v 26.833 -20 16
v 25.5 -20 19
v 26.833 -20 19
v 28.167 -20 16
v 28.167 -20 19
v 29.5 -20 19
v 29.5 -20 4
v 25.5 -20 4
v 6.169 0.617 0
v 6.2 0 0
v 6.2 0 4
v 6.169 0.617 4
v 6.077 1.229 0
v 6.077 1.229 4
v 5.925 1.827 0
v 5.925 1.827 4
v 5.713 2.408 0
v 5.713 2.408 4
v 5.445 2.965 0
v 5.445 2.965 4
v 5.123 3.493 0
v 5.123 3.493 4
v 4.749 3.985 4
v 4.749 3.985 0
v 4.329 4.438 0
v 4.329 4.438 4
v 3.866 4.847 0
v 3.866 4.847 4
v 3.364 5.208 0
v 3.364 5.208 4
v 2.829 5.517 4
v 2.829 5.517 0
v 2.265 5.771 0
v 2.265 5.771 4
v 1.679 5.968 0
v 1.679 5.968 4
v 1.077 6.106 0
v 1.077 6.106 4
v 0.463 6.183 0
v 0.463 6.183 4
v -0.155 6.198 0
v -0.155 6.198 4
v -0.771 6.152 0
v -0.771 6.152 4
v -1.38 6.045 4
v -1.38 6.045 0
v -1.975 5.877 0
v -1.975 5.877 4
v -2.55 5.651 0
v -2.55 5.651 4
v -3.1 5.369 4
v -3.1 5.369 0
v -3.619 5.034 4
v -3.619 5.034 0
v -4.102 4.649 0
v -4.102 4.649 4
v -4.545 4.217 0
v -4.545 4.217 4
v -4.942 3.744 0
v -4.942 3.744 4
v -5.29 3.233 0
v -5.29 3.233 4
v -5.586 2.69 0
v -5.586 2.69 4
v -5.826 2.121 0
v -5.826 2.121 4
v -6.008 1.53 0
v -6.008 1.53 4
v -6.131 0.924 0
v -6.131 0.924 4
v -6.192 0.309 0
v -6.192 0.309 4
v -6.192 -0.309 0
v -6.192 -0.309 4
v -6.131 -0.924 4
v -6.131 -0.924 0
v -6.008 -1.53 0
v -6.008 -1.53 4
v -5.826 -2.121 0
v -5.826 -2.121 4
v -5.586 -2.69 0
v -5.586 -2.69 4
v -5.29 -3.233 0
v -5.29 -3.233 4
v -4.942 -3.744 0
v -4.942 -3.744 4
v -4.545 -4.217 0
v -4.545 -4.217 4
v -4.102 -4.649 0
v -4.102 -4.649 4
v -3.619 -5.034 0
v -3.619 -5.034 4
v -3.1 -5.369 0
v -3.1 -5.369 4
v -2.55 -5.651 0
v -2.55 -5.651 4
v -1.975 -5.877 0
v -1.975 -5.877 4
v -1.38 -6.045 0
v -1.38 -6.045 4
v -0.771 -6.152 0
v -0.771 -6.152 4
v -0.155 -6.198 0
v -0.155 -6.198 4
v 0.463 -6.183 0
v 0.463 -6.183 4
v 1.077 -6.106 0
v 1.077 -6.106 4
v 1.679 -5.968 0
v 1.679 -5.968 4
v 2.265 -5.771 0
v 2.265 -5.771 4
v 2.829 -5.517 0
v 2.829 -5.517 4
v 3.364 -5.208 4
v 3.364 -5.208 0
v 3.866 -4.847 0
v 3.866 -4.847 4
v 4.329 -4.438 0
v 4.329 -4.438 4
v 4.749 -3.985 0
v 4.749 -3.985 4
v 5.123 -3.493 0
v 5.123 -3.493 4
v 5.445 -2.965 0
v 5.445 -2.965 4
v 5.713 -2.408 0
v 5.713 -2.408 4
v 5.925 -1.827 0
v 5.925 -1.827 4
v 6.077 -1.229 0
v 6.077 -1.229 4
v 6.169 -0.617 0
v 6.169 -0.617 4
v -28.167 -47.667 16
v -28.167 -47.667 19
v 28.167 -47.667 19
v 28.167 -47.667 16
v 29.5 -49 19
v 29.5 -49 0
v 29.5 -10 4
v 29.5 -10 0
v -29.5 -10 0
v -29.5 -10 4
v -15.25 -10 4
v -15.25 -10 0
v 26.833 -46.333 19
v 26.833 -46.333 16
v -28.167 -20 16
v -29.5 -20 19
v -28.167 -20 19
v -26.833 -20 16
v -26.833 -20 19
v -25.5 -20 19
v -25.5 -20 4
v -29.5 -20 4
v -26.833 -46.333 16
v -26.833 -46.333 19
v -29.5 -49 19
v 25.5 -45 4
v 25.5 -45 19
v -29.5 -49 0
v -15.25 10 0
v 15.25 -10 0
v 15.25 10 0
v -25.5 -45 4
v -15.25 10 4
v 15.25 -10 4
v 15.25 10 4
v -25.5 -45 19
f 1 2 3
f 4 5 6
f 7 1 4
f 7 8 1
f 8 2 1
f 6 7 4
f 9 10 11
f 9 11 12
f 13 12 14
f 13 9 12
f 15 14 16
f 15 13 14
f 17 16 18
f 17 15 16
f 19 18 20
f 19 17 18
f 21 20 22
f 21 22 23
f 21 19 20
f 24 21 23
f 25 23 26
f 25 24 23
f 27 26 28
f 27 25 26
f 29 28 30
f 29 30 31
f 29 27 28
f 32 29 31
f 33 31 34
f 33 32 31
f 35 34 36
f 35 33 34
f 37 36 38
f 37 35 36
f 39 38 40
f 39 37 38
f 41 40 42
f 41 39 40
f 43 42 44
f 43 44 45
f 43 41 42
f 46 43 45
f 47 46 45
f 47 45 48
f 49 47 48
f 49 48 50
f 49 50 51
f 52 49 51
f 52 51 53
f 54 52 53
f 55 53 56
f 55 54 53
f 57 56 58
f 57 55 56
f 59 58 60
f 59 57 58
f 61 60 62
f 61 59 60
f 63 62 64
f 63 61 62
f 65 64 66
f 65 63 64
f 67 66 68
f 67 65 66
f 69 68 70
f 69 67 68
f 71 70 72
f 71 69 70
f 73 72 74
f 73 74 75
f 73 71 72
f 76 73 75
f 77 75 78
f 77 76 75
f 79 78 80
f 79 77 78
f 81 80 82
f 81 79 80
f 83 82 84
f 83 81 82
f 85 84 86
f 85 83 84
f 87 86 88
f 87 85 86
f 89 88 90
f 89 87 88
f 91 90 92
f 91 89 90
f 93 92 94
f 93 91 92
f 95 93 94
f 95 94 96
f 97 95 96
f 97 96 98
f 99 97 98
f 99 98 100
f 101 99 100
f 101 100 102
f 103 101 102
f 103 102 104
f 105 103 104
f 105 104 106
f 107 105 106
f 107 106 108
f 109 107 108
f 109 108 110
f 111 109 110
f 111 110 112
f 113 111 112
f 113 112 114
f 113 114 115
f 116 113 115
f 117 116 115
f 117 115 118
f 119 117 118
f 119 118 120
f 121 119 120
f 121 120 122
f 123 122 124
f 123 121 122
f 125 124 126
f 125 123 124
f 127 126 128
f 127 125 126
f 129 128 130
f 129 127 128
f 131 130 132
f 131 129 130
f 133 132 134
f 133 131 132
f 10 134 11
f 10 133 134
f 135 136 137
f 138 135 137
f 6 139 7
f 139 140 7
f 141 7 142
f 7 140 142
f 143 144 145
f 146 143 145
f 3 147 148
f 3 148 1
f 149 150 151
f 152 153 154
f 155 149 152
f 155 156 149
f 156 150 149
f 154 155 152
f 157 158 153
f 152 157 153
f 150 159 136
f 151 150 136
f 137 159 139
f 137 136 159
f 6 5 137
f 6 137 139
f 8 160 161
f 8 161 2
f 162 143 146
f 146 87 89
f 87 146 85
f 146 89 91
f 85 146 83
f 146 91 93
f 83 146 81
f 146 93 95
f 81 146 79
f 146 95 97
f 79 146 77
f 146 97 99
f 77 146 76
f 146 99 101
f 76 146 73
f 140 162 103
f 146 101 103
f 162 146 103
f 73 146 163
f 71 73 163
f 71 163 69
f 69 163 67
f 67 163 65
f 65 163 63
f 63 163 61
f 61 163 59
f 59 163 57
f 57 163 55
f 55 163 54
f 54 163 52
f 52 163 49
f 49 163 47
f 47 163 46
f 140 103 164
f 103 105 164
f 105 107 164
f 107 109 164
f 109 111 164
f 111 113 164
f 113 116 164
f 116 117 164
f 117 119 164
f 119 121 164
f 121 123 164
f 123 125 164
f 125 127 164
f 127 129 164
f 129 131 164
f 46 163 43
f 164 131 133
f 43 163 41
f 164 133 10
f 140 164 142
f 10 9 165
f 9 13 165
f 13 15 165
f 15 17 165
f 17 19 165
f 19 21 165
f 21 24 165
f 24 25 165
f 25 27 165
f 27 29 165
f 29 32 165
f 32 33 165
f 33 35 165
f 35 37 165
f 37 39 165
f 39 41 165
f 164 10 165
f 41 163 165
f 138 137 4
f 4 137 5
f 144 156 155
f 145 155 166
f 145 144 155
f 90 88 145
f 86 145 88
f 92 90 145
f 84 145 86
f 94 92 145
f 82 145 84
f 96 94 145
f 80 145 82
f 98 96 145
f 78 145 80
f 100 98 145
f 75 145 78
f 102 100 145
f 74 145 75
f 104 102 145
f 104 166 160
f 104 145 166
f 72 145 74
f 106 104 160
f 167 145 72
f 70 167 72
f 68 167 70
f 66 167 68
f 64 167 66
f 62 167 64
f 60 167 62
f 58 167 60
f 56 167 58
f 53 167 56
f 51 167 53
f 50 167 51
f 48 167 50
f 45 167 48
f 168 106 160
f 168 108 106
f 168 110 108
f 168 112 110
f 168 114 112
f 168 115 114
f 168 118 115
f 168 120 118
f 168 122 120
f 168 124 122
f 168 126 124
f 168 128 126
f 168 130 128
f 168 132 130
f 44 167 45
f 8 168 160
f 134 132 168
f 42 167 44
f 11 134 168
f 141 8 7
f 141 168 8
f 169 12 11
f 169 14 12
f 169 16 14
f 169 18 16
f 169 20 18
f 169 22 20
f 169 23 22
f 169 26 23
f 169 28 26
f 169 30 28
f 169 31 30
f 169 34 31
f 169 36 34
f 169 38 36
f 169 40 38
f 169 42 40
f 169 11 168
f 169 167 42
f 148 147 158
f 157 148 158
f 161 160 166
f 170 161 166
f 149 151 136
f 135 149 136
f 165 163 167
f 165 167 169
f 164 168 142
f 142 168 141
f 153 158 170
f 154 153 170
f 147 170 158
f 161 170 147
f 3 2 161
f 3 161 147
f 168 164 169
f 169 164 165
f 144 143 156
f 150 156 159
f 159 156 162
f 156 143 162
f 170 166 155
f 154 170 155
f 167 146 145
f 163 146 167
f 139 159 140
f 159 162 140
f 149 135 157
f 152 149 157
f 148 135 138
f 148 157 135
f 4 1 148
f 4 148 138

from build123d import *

# Parameters (mm, degrees)
SKETCH1_W           = 30.5
SKETCH1_H           = 20
SKETCH1_R           = 6.2
BOSS_EXTRUDE1_DEPTH = 4
SKETCH2_W           = 59
SKETCH2_H           = 4
BOSS_EXTRUDE2_DEPTH = 35
SKETCH4_W           = 59
SKETCH4_H           = 4
BOSS_EXTRUDE3_DEPTH = 4
SKETCH5_W           = 4
SKETCH5_H           = 25
BOSS_EXTRUDE4_DEPTH = 15
SKETCH6_W           = 1.333333334
SKETCH6_H           = 26.333333333
CUT_EXTRUDE1_DEPTH  = 3


with BuildPart() as part:
    # Sketch1 → Boss-Extrude1 (new body)
    with BuildSketch(Plane.XY):
        Rectangle(SKETCH1_W, SKETCH1_H)
        Circle(SKETCH1_R, mode=Mode.SUBTRACT)
    extrude(amount=BOSS_EXTRUDE1_DEPTH)

    # Sketch2 → Boss-Extrude2 (add)
    with BuildSketch(Plane.XZ.offset(10)):
        with Locations((0, 2)):
            Rectangle(SKETCH2_W, SKETCH2_H)
    extrude(amount=BOSS_EXTRUDE2_DEPTH)

    # Sketch4 → Boss-Extrude3 (add)
    with BuildSketch(Plane.XZ.offset(45)):
        with Locations((0, 2)):
            Rectangle(SKETCH4_W, SKETCH4_H)
    extrude(amount=BOSS_EXTRUDE3_DEPTH)

    # Sketch5 → Boss-Extrude4 (add)
    with BuildSketch(Plane.XY.offset(4)):
        with Locations((-27.5, -32.5)):
            Rectangle(SKETCH5_W, SKETCH5_H)
        Polygon((-29.5, -45), (-29.5, -49), (29.5, -49), (29.5, -45), (25.5, -45), (-25.5, -45), align=None)
        with Locations((27.5, -32.5)):
            Rectangle(SKETCH5_W, SKETCH5_H)
    extrude(amount=BOSS_EXTRUDE4_DEPTH)

    # Sketch6 → Cut-Extrude1 (cut)
    with BuildSketch(Plane.XY.offset(19)):
        Polygon((-26.833333333, -20), (-28.166666667, -20), (-28.166666667, -47.666666667), (-26.833333333, -47.666666667), (-26.833333333, -46.333333333), align=None)
        Polygon((26.833333333, -46.333333333), (-26.833333333, -46.333333333), (-26.833333333, -47.666666667), (28.166666667, -47.666666667), (28.166666667, -46.333333333), align=None)
        with Locations((27.5, -33.166666667)):
            Rectangle(SKETCH6_W, SKETCH6_H)
    extrude(amount=-CUT_EXTRUDE1_DEPTH, mode=Mode.SUBTRACT)


solid = part.part
